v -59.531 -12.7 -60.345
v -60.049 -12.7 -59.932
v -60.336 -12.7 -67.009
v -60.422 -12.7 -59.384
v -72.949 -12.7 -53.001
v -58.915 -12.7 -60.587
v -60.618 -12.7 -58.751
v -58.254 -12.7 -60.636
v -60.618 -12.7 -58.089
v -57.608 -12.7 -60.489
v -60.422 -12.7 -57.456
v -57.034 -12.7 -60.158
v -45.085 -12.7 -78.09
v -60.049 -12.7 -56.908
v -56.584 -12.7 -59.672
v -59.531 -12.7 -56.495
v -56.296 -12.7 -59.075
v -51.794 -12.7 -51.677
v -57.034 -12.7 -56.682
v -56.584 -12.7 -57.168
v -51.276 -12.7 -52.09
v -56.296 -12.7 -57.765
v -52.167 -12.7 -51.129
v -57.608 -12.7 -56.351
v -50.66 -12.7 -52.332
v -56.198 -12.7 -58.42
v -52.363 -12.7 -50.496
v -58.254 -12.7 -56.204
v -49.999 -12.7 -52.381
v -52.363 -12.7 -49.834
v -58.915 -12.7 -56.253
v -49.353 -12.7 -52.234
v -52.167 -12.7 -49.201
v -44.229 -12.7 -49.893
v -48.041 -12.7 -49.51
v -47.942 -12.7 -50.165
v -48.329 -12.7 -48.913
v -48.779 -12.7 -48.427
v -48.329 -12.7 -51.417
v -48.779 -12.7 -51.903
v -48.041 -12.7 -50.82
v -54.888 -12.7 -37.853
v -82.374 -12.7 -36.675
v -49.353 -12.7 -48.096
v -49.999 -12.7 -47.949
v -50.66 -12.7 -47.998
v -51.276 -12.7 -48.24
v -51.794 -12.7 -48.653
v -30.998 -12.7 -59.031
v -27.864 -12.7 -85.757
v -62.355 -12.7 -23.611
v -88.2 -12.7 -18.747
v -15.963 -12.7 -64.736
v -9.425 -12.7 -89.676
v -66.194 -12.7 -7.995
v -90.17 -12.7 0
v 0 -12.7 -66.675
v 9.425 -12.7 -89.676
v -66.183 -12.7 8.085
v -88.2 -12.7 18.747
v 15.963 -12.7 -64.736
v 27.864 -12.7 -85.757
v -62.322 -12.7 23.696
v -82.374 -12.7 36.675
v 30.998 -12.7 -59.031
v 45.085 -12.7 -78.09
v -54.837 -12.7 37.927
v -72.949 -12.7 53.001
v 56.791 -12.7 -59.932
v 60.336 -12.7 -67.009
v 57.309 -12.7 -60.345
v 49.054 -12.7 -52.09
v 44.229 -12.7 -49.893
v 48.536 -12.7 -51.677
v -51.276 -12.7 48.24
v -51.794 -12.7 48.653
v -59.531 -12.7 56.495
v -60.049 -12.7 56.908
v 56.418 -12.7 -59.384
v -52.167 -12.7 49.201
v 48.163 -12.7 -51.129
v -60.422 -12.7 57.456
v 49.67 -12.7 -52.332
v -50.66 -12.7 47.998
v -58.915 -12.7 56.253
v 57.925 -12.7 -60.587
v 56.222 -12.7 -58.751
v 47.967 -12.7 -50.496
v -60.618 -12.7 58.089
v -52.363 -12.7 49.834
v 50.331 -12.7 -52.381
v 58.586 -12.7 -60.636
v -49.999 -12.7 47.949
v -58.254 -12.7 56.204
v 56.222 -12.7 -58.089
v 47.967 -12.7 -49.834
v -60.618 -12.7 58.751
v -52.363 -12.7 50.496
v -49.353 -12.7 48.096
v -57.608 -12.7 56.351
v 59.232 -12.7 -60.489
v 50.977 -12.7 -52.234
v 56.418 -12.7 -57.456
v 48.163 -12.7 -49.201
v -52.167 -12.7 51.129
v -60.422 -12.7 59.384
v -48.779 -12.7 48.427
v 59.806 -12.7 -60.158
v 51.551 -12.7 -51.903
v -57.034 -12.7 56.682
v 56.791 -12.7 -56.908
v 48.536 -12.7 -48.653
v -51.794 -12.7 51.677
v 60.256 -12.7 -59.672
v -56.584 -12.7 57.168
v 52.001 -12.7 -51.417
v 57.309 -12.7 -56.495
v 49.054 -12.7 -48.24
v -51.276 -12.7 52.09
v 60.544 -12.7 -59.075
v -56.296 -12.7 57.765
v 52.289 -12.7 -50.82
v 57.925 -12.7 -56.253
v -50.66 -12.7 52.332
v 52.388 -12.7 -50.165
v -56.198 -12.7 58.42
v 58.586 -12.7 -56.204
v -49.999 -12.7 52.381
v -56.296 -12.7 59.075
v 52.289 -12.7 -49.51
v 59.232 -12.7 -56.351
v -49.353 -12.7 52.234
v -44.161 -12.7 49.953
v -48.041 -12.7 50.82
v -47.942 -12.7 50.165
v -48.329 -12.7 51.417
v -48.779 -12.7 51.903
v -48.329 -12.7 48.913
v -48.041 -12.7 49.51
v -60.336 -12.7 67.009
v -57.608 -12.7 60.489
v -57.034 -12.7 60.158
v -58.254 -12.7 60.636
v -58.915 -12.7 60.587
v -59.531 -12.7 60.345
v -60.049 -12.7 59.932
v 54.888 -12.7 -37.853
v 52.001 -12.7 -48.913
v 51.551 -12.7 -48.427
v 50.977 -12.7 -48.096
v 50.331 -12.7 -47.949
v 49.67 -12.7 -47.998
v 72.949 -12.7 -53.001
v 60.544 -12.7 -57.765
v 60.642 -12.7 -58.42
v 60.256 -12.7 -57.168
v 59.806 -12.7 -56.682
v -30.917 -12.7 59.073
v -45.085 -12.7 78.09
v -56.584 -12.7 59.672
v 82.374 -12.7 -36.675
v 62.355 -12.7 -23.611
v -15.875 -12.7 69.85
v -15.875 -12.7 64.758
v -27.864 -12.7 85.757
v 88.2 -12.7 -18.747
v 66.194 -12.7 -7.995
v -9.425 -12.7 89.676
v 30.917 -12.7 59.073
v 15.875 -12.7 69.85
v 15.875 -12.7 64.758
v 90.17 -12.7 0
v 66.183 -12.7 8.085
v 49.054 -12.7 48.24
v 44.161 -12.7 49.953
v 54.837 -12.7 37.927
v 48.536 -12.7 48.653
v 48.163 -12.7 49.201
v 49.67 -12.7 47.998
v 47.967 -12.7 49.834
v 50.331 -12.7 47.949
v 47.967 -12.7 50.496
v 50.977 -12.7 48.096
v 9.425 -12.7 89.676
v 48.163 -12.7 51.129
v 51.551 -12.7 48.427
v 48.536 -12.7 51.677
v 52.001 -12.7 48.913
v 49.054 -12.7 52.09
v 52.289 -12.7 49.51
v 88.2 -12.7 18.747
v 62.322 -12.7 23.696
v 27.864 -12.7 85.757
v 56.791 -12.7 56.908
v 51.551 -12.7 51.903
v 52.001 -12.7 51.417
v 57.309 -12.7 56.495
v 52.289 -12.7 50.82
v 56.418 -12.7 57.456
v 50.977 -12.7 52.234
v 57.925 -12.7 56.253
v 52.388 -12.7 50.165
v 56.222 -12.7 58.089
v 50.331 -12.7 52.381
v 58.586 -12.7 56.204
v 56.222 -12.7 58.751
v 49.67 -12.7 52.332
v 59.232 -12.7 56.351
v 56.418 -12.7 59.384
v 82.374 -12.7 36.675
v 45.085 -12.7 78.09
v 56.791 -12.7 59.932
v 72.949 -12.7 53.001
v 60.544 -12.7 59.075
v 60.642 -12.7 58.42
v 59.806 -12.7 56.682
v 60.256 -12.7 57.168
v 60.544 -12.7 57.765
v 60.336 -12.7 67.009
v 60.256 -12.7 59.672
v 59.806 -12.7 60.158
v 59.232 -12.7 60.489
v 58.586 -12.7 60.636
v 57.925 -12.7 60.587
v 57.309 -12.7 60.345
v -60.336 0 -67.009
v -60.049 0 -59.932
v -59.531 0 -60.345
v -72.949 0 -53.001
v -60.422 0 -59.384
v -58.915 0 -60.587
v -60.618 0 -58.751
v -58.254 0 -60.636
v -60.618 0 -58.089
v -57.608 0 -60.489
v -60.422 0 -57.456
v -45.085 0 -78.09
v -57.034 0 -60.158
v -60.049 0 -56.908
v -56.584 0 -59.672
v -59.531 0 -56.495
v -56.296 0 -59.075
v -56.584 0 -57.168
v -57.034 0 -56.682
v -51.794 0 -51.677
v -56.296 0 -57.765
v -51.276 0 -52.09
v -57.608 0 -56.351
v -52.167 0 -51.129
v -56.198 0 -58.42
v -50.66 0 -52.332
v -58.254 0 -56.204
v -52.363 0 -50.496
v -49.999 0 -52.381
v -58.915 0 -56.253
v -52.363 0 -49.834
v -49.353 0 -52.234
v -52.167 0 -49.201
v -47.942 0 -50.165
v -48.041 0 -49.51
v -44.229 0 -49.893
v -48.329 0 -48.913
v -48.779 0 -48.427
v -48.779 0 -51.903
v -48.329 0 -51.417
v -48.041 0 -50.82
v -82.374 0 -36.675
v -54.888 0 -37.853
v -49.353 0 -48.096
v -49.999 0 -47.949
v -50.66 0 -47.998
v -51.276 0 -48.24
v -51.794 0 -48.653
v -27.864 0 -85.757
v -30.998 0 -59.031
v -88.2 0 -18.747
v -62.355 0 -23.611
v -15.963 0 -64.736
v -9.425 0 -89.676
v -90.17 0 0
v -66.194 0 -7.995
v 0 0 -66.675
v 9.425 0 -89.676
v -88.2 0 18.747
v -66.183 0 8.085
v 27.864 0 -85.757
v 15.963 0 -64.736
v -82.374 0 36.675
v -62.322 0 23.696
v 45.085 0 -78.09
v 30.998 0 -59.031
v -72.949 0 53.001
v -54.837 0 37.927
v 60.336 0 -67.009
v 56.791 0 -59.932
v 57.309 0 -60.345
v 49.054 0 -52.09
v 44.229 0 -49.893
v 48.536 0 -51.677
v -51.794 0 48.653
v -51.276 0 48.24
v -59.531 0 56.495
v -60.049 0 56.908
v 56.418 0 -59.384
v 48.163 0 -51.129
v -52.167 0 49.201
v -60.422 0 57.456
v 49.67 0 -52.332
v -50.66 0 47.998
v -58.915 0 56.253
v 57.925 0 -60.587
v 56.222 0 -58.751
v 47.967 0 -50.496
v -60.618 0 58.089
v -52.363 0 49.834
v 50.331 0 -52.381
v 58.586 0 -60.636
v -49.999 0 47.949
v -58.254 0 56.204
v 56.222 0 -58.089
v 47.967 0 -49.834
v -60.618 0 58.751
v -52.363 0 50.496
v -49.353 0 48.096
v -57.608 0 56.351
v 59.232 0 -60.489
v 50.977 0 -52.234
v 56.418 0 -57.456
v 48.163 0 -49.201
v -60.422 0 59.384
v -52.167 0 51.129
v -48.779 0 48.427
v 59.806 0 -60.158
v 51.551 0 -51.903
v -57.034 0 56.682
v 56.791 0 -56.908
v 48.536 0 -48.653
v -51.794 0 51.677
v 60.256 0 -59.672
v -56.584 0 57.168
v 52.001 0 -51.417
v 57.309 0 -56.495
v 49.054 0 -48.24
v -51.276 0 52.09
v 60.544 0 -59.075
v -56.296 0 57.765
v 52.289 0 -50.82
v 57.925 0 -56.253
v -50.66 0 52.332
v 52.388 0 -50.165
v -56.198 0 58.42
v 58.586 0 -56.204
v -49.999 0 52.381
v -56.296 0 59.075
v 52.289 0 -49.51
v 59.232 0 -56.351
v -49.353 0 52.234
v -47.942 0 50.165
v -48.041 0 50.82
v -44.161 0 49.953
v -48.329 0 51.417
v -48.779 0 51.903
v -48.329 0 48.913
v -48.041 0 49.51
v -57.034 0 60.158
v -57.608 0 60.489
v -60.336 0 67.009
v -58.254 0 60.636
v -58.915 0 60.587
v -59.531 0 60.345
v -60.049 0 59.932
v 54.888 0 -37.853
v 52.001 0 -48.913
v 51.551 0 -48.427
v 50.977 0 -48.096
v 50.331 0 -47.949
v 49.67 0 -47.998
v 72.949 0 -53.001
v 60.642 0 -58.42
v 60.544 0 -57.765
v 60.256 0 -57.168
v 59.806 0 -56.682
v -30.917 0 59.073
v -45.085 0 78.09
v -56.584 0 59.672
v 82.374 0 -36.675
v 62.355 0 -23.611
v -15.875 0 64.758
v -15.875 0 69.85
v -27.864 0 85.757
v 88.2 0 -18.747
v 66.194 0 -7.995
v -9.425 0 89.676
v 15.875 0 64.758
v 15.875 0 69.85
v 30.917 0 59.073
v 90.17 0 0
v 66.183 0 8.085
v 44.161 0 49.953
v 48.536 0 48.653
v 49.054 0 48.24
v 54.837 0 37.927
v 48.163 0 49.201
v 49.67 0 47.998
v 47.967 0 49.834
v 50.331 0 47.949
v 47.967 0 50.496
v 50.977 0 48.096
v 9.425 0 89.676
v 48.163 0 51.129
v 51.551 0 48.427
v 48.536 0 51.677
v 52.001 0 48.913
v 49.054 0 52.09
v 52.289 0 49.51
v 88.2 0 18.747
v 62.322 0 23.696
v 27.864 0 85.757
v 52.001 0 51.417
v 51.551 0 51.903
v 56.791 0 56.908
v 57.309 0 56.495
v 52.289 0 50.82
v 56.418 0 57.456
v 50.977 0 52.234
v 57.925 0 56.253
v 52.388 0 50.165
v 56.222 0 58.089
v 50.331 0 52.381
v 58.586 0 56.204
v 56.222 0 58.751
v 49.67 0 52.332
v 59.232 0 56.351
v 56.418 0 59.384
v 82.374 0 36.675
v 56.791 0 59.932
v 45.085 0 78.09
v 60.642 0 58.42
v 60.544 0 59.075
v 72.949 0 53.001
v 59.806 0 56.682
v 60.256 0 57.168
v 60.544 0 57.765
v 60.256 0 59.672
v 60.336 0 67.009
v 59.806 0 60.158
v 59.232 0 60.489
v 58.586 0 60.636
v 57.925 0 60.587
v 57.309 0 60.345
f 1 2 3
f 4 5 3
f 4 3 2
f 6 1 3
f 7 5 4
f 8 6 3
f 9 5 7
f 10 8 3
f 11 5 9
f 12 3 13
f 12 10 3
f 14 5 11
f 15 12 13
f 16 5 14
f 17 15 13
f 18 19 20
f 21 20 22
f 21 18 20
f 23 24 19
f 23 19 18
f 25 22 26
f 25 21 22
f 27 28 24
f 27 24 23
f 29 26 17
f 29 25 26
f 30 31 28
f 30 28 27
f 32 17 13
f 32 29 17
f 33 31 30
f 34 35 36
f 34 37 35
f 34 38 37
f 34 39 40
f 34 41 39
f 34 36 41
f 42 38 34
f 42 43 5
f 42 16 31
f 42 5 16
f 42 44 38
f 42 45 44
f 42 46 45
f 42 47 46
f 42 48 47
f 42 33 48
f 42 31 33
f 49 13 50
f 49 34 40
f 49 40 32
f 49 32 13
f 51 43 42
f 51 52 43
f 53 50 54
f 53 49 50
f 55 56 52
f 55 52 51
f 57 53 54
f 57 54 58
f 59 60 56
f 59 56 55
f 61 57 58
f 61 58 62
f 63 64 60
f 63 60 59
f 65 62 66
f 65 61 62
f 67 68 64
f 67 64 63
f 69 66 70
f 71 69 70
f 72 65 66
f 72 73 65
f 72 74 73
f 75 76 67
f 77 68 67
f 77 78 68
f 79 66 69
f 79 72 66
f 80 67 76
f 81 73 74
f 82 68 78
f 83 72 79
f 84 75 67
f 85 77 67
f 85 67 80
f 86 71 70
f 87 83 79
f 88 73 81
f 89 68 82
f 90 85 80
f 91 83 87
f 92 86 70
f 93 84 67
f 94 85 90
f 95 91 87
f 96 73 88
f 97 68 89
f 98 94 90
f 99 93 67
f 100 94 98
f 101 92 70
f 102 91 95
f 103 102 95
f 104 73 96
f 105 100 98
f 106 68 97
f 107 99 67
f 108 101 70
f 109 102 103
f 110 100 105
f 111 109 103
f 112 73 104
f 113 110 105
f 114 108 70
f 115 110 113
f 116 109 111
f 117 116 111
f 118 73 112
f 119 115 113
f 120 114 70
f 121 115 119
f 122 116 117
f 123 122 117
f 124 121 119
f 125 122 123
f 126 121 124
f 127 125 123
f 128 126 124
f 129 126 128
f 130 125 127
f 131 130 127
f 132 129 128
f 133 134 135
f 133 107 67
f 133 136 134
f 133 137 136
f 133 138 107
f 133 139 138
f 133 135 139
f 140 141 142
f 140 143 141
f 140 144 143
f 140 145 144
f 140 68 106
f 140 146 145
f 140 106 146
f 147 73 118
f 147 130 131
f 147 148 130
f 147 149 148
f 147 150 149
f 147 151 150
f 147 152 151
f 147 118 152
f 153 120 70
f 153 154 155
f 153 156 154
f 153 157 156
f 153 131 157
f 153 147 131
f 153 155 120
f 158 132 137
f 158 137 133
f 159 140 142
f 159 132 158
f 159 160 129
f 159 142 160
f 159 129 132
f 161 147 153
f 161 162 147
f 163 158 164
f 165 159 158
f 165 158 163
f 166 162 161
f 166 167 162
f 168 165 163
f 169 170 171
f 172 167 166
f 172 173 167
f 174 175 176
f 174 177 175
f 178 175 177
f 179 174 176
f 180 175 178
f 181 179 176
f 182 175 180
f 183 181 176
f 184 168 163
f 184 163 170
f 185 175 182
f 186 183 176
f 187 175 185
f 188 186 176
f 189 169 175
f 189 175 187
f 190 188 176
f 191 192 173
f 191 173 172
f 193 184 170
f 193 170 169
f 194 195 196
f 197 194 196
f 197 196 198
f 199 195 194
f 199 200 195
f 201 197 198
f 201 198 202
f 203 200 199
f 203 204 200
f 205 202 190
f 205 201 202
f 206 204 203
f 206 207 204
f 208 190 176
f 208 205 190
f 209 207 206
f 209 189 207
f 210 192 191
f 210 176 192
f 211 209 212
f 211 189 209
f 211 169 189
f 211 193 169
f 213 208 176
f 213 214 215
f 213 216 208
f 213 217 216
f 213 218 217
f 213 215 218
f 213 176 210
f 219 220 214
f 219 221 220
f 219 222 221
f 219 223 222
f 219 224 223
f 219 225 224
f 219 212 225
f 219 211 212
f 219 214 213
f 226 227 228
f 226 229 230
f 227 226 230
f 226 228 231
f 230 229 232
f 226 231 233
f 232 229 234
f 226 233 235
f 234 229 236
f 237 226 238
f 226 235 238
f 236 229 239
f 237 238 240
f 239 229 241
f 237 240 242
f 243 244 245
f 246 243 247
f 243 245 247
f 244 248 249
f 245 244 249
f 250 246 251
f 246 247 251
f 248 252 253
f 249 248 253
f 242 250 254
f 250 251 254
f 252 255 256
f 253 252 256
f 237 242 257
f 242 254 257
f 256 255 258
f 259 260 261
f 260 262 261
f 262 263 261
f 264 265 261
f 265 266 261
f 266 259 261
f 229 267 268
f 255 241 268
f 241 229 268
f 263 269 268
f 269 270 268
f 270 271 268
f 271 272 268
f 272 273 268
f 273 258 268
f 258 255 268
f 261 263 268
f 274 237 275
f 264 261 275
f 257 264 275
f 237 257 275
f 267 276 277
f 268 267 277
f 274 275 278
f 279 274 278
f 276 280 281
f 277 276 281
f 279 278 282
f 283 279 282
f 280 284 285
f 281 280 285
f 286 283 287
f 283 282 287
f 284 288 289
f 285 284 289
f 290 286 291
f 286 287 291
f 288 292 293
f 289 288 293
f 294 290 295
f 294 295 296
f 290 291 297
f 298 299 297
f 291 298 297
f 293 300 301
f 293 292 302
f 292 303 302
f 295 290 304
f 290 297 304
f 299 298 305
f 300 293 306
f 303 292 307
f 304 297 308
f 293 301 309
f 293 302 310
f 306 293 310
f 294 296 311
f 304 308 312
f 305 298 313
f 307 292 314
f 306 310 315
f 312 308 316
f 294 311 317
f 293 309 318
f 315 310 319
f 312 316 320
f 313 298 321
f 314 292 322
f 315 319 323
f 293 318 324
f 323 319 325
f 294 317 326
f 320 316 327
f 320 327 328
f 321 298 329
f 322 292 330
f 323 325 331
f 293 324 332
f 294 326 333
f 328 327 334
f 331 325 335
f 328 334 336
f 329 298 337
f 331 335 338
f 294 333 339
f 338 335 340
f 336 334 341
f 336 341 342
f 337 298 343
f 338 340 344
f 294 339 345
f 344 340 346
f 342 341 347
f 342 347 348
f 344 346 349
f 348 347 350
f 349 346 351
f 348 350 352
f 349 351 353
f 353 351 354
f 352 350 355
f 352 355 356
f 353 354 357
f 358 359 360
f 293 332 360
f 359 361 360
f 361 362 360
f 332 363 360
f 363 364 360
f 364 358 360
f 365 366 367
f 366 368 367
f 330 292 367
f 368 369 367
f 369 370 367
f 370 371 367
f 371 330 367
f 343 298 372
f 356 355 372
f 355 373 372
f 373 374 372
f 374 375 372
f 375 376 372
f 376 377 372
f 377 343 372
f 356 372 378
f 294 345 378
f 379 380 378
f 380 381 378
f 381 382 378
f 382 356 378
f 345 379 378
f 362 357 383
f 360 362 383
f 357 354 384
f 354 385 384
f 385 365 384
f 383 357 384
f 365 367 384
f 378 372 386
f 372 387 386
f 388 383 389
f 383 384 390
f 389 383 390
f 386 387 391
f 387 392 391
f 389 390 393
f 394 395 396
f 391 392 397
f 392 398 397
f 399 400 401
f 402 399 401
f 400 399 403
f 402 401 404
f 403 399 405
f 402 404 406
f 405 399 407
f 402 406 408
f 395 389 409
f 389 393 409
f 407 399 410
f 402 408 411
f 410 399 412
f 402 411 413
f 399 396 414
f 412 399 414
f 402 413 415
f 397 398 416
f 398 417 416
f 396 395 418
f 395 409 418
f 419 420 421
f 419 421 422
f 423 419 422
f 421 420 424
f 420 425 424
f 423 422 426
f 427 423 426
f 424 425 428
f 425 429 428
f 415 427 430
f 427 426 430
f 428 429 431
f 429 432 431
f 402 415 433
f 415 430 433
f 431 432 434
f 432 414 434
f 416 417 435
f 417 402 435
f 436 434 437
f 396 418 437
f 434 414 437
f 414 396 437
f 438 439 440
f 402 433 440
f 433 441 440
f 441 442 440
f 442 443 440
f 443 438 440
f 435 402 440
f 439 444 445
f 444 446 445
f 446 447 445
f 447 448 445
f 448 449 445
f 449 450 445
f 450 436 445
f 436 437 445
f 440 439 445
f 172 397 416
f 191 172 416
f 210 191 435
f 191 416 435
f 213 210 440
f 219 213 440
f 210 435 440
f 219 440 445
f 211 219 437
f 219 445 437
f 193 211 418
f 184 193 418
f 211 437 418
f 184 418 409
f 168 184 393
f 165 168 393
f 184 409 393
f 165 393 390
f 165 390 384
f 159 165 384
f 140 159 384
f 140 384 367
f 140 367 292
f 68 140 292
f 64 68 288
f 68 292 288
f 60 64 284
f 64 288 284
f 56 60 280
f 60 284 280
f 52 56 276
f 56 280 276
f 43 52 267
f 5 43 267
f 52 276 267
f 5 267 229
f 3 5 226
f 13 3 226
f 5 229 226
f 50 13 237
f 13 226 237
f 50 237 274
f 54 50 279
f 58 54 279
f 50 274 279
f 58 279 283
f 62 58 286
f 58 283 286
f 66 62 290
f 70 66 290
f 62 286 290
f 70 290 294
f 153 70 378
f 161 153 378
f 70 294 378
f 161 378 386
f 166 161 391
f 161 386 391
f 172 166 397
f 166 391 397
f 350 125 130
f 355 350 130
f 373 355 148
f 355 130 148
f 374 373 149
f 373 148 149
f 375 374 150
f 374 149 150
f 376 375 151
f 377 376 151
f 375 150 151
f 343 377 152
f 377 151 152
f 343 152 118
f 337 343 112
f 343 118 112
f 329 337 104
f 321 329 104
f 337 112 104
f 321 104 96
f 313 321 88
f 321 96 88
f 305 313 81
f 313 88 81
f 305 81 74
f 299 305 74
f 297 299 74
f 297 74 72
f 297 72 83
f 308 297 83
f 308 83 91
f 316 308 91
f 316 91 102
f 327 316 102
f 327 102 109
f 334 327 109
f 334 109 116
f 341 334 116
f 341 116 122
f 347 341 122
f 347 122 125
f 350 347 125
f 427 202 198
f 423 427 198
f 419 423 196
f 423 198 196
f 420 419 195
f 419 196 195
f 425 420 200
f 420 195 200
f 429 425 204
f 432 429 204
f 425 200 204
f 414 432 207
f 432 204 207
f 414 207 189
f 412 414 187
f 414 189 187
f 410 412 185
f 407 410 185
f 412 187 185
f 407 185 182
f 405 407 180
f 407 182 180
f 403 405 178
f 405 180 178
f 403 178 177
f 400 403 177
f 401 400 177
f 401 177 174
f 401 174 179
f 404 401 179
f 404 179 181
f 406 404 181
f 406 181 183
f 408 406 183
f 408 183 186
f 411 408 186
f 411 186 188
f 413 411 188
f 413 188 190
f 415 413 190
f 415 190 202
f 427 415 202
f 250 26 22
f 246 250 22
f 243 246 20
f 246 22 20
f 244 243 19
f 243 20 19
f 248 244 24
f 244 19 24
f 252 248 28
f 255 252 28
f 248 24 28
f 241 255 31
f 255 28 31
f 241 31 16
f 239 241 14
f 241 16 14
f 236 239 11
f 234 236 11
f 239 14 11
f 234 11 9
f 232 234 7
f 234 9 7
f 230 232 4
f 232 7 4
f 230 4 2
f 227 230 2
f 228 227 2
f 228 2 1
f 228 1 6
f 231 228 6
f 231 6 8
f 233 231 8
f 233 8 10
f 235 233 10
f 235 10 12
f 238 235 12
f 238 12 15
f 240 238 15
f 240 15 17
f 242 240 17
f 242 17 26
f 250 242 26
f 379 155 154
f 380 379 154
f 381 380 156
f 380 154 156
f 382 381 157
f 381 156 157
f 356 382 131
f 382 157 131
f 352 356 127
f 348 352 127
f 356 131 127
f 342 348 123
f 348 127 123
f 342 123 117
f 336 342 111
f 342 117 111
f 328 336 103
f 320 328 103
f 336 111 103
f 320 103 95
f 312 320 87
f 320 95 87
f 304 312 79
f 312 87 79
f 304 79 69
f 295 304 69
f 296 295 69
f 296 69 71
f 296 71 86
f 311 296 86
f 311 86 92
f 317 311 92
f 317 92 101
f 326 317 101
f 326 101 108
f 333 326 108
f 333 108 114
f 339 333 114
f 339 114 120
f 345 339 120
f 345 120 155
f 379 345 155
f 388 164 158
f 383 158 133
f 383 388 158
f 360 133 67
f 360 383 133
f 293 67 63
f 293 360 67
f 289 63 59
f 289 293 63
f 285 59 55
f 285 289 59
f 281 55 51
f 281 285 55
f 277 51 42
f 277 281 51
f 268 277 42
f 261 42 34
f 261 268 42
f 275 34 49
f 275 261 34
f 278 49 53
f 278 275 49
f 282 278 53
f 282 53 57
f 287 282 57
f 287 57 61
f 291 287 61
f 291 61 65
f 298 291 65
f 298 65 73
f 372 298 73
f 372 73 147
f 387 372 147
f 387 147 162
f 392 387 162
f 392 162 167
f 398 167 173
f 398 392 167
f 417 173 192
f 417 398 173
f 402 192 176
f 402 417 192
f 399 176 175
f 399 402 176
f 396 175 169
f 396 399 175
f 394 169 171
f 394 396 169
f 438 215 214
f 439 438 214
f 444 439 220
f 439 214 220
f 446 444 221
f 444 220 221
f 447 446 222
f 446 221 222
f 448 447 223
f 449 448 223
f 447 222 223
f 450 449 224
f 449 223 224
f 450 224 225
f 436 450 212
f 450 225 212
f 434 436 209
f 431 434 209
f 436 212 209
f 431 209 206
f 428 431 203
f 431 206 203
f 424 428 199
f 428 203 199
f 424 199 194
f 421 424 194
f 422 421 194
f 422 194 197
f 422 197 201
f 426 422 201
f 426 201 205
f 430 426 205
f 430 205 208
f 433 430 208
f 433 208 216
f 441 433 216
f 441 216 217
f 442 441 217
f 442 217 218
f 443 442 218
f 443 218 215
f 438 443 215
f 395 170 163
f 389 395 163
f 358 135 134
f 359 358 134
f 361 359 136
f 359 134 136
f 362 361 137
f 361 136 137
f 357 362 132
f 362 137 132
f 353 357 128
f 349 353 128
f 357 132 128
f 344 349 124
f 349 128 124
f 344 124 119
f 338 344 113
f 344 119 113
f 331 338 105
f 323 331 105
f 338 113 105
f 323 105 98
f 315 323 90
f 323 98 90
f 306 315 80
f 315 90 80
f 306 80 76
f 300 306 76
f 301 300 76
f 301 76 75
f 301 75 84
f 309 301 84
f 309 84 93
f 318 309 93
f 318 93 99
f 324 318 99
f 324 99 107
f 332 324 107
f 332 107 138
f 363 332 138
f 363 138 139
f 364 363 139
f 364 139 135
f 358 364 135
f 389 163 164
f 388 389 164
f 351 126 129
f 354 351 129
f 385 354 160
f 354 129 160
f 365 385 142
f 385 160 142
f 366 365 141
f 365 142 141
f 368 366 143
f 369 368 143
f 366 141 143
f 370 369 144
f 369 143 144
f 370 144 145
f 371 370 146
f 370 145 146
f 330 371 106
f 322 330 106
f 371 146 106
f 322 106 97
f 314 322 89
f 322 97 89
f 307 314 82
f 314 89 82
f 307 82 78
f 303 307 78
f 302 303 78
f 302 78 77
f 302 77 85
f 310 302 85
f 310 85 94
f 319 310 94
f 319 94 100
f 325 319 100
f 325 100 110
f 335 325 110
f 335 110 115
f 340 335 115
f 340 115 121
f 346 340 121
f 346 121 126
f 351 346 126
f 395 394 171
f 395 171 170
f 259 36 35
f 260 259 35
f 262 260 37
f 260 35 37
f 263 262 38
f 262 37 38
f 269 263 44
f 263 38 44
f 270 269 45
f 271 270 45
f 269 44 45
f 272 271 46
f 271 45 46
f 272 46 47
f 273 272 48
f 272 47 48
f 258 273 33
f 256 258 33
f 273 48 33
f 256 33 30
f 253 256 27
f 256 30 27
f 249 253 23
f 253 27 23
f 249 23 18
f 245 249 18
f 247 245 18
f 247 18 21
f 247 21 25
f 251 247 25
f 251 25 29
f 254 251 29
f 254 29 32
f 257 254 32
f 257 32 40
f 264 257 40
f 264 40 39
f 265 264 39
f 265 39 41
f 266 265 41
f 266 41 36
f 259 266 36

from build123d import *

# Parameters (mm, degrees)
F0_R     = 90.17
F0_R_2   = 66.675
F1_DEPTH = 12.7
F2_R     = 2.2225
F3_DEPTH = 12.701
F5_DEPTH = 12.701


with BuildPart() as f1:
    # F0 (on Front) → F1 (new body)
    with BuildSketch(Plane.XZ):
        Circle(F0_R)
        Circle(F0_R_2, mode=Mode.SUBTRACT)
    extrude(amount=F1_DEPTH)

    # F2 (on face) → F3 (cut, through all)
    with BuildSketch(Plane.XZ.offset(12.7)):
        with Locations((-58.42, 58.42)):
            Circle(F2_R)
        with Locations((-50.165, 50.165)):
            Circle(F2_R)
        with Locations((50.165, 50.165)):
            Circle(F2_R)
        with Locations((58.42, 58.42)):
            Circle(F2_R)
        with Locations((50.165, -50.165)):
            Circle(F2_R)
        with Locations((58.42, -58.42)):
            Circle(F2_R)
        with Locations((-58.42, -58.42)):
            Circle(F2_R)
        with Locations((-50.165, -50.165)):
            Circle(F2_R)
    extrude(amount=-F3_DEPTH, mode=Mode.SUBTRACT)

    # F4 (on face) → F5 (cut, through all)
    with BuildSketch(Plane.XZ.offset(12.7)):
        with BuildLine():
            Line((15.875, 69.85), (-15.875, 69.85))
            Line((-15.875, 69.85), (-15.875, 64.757548))
            ThreePointArc((-15.875, 64.757548), (0, 66.675), (15.875, 64.757548))
            Line((15.875, 64.757548), (15.875, 69.85))
        make_face()
    extrude(amount=-F5_DEPTH, mode=Mode.SUBTRACT)


solid = f1.part
